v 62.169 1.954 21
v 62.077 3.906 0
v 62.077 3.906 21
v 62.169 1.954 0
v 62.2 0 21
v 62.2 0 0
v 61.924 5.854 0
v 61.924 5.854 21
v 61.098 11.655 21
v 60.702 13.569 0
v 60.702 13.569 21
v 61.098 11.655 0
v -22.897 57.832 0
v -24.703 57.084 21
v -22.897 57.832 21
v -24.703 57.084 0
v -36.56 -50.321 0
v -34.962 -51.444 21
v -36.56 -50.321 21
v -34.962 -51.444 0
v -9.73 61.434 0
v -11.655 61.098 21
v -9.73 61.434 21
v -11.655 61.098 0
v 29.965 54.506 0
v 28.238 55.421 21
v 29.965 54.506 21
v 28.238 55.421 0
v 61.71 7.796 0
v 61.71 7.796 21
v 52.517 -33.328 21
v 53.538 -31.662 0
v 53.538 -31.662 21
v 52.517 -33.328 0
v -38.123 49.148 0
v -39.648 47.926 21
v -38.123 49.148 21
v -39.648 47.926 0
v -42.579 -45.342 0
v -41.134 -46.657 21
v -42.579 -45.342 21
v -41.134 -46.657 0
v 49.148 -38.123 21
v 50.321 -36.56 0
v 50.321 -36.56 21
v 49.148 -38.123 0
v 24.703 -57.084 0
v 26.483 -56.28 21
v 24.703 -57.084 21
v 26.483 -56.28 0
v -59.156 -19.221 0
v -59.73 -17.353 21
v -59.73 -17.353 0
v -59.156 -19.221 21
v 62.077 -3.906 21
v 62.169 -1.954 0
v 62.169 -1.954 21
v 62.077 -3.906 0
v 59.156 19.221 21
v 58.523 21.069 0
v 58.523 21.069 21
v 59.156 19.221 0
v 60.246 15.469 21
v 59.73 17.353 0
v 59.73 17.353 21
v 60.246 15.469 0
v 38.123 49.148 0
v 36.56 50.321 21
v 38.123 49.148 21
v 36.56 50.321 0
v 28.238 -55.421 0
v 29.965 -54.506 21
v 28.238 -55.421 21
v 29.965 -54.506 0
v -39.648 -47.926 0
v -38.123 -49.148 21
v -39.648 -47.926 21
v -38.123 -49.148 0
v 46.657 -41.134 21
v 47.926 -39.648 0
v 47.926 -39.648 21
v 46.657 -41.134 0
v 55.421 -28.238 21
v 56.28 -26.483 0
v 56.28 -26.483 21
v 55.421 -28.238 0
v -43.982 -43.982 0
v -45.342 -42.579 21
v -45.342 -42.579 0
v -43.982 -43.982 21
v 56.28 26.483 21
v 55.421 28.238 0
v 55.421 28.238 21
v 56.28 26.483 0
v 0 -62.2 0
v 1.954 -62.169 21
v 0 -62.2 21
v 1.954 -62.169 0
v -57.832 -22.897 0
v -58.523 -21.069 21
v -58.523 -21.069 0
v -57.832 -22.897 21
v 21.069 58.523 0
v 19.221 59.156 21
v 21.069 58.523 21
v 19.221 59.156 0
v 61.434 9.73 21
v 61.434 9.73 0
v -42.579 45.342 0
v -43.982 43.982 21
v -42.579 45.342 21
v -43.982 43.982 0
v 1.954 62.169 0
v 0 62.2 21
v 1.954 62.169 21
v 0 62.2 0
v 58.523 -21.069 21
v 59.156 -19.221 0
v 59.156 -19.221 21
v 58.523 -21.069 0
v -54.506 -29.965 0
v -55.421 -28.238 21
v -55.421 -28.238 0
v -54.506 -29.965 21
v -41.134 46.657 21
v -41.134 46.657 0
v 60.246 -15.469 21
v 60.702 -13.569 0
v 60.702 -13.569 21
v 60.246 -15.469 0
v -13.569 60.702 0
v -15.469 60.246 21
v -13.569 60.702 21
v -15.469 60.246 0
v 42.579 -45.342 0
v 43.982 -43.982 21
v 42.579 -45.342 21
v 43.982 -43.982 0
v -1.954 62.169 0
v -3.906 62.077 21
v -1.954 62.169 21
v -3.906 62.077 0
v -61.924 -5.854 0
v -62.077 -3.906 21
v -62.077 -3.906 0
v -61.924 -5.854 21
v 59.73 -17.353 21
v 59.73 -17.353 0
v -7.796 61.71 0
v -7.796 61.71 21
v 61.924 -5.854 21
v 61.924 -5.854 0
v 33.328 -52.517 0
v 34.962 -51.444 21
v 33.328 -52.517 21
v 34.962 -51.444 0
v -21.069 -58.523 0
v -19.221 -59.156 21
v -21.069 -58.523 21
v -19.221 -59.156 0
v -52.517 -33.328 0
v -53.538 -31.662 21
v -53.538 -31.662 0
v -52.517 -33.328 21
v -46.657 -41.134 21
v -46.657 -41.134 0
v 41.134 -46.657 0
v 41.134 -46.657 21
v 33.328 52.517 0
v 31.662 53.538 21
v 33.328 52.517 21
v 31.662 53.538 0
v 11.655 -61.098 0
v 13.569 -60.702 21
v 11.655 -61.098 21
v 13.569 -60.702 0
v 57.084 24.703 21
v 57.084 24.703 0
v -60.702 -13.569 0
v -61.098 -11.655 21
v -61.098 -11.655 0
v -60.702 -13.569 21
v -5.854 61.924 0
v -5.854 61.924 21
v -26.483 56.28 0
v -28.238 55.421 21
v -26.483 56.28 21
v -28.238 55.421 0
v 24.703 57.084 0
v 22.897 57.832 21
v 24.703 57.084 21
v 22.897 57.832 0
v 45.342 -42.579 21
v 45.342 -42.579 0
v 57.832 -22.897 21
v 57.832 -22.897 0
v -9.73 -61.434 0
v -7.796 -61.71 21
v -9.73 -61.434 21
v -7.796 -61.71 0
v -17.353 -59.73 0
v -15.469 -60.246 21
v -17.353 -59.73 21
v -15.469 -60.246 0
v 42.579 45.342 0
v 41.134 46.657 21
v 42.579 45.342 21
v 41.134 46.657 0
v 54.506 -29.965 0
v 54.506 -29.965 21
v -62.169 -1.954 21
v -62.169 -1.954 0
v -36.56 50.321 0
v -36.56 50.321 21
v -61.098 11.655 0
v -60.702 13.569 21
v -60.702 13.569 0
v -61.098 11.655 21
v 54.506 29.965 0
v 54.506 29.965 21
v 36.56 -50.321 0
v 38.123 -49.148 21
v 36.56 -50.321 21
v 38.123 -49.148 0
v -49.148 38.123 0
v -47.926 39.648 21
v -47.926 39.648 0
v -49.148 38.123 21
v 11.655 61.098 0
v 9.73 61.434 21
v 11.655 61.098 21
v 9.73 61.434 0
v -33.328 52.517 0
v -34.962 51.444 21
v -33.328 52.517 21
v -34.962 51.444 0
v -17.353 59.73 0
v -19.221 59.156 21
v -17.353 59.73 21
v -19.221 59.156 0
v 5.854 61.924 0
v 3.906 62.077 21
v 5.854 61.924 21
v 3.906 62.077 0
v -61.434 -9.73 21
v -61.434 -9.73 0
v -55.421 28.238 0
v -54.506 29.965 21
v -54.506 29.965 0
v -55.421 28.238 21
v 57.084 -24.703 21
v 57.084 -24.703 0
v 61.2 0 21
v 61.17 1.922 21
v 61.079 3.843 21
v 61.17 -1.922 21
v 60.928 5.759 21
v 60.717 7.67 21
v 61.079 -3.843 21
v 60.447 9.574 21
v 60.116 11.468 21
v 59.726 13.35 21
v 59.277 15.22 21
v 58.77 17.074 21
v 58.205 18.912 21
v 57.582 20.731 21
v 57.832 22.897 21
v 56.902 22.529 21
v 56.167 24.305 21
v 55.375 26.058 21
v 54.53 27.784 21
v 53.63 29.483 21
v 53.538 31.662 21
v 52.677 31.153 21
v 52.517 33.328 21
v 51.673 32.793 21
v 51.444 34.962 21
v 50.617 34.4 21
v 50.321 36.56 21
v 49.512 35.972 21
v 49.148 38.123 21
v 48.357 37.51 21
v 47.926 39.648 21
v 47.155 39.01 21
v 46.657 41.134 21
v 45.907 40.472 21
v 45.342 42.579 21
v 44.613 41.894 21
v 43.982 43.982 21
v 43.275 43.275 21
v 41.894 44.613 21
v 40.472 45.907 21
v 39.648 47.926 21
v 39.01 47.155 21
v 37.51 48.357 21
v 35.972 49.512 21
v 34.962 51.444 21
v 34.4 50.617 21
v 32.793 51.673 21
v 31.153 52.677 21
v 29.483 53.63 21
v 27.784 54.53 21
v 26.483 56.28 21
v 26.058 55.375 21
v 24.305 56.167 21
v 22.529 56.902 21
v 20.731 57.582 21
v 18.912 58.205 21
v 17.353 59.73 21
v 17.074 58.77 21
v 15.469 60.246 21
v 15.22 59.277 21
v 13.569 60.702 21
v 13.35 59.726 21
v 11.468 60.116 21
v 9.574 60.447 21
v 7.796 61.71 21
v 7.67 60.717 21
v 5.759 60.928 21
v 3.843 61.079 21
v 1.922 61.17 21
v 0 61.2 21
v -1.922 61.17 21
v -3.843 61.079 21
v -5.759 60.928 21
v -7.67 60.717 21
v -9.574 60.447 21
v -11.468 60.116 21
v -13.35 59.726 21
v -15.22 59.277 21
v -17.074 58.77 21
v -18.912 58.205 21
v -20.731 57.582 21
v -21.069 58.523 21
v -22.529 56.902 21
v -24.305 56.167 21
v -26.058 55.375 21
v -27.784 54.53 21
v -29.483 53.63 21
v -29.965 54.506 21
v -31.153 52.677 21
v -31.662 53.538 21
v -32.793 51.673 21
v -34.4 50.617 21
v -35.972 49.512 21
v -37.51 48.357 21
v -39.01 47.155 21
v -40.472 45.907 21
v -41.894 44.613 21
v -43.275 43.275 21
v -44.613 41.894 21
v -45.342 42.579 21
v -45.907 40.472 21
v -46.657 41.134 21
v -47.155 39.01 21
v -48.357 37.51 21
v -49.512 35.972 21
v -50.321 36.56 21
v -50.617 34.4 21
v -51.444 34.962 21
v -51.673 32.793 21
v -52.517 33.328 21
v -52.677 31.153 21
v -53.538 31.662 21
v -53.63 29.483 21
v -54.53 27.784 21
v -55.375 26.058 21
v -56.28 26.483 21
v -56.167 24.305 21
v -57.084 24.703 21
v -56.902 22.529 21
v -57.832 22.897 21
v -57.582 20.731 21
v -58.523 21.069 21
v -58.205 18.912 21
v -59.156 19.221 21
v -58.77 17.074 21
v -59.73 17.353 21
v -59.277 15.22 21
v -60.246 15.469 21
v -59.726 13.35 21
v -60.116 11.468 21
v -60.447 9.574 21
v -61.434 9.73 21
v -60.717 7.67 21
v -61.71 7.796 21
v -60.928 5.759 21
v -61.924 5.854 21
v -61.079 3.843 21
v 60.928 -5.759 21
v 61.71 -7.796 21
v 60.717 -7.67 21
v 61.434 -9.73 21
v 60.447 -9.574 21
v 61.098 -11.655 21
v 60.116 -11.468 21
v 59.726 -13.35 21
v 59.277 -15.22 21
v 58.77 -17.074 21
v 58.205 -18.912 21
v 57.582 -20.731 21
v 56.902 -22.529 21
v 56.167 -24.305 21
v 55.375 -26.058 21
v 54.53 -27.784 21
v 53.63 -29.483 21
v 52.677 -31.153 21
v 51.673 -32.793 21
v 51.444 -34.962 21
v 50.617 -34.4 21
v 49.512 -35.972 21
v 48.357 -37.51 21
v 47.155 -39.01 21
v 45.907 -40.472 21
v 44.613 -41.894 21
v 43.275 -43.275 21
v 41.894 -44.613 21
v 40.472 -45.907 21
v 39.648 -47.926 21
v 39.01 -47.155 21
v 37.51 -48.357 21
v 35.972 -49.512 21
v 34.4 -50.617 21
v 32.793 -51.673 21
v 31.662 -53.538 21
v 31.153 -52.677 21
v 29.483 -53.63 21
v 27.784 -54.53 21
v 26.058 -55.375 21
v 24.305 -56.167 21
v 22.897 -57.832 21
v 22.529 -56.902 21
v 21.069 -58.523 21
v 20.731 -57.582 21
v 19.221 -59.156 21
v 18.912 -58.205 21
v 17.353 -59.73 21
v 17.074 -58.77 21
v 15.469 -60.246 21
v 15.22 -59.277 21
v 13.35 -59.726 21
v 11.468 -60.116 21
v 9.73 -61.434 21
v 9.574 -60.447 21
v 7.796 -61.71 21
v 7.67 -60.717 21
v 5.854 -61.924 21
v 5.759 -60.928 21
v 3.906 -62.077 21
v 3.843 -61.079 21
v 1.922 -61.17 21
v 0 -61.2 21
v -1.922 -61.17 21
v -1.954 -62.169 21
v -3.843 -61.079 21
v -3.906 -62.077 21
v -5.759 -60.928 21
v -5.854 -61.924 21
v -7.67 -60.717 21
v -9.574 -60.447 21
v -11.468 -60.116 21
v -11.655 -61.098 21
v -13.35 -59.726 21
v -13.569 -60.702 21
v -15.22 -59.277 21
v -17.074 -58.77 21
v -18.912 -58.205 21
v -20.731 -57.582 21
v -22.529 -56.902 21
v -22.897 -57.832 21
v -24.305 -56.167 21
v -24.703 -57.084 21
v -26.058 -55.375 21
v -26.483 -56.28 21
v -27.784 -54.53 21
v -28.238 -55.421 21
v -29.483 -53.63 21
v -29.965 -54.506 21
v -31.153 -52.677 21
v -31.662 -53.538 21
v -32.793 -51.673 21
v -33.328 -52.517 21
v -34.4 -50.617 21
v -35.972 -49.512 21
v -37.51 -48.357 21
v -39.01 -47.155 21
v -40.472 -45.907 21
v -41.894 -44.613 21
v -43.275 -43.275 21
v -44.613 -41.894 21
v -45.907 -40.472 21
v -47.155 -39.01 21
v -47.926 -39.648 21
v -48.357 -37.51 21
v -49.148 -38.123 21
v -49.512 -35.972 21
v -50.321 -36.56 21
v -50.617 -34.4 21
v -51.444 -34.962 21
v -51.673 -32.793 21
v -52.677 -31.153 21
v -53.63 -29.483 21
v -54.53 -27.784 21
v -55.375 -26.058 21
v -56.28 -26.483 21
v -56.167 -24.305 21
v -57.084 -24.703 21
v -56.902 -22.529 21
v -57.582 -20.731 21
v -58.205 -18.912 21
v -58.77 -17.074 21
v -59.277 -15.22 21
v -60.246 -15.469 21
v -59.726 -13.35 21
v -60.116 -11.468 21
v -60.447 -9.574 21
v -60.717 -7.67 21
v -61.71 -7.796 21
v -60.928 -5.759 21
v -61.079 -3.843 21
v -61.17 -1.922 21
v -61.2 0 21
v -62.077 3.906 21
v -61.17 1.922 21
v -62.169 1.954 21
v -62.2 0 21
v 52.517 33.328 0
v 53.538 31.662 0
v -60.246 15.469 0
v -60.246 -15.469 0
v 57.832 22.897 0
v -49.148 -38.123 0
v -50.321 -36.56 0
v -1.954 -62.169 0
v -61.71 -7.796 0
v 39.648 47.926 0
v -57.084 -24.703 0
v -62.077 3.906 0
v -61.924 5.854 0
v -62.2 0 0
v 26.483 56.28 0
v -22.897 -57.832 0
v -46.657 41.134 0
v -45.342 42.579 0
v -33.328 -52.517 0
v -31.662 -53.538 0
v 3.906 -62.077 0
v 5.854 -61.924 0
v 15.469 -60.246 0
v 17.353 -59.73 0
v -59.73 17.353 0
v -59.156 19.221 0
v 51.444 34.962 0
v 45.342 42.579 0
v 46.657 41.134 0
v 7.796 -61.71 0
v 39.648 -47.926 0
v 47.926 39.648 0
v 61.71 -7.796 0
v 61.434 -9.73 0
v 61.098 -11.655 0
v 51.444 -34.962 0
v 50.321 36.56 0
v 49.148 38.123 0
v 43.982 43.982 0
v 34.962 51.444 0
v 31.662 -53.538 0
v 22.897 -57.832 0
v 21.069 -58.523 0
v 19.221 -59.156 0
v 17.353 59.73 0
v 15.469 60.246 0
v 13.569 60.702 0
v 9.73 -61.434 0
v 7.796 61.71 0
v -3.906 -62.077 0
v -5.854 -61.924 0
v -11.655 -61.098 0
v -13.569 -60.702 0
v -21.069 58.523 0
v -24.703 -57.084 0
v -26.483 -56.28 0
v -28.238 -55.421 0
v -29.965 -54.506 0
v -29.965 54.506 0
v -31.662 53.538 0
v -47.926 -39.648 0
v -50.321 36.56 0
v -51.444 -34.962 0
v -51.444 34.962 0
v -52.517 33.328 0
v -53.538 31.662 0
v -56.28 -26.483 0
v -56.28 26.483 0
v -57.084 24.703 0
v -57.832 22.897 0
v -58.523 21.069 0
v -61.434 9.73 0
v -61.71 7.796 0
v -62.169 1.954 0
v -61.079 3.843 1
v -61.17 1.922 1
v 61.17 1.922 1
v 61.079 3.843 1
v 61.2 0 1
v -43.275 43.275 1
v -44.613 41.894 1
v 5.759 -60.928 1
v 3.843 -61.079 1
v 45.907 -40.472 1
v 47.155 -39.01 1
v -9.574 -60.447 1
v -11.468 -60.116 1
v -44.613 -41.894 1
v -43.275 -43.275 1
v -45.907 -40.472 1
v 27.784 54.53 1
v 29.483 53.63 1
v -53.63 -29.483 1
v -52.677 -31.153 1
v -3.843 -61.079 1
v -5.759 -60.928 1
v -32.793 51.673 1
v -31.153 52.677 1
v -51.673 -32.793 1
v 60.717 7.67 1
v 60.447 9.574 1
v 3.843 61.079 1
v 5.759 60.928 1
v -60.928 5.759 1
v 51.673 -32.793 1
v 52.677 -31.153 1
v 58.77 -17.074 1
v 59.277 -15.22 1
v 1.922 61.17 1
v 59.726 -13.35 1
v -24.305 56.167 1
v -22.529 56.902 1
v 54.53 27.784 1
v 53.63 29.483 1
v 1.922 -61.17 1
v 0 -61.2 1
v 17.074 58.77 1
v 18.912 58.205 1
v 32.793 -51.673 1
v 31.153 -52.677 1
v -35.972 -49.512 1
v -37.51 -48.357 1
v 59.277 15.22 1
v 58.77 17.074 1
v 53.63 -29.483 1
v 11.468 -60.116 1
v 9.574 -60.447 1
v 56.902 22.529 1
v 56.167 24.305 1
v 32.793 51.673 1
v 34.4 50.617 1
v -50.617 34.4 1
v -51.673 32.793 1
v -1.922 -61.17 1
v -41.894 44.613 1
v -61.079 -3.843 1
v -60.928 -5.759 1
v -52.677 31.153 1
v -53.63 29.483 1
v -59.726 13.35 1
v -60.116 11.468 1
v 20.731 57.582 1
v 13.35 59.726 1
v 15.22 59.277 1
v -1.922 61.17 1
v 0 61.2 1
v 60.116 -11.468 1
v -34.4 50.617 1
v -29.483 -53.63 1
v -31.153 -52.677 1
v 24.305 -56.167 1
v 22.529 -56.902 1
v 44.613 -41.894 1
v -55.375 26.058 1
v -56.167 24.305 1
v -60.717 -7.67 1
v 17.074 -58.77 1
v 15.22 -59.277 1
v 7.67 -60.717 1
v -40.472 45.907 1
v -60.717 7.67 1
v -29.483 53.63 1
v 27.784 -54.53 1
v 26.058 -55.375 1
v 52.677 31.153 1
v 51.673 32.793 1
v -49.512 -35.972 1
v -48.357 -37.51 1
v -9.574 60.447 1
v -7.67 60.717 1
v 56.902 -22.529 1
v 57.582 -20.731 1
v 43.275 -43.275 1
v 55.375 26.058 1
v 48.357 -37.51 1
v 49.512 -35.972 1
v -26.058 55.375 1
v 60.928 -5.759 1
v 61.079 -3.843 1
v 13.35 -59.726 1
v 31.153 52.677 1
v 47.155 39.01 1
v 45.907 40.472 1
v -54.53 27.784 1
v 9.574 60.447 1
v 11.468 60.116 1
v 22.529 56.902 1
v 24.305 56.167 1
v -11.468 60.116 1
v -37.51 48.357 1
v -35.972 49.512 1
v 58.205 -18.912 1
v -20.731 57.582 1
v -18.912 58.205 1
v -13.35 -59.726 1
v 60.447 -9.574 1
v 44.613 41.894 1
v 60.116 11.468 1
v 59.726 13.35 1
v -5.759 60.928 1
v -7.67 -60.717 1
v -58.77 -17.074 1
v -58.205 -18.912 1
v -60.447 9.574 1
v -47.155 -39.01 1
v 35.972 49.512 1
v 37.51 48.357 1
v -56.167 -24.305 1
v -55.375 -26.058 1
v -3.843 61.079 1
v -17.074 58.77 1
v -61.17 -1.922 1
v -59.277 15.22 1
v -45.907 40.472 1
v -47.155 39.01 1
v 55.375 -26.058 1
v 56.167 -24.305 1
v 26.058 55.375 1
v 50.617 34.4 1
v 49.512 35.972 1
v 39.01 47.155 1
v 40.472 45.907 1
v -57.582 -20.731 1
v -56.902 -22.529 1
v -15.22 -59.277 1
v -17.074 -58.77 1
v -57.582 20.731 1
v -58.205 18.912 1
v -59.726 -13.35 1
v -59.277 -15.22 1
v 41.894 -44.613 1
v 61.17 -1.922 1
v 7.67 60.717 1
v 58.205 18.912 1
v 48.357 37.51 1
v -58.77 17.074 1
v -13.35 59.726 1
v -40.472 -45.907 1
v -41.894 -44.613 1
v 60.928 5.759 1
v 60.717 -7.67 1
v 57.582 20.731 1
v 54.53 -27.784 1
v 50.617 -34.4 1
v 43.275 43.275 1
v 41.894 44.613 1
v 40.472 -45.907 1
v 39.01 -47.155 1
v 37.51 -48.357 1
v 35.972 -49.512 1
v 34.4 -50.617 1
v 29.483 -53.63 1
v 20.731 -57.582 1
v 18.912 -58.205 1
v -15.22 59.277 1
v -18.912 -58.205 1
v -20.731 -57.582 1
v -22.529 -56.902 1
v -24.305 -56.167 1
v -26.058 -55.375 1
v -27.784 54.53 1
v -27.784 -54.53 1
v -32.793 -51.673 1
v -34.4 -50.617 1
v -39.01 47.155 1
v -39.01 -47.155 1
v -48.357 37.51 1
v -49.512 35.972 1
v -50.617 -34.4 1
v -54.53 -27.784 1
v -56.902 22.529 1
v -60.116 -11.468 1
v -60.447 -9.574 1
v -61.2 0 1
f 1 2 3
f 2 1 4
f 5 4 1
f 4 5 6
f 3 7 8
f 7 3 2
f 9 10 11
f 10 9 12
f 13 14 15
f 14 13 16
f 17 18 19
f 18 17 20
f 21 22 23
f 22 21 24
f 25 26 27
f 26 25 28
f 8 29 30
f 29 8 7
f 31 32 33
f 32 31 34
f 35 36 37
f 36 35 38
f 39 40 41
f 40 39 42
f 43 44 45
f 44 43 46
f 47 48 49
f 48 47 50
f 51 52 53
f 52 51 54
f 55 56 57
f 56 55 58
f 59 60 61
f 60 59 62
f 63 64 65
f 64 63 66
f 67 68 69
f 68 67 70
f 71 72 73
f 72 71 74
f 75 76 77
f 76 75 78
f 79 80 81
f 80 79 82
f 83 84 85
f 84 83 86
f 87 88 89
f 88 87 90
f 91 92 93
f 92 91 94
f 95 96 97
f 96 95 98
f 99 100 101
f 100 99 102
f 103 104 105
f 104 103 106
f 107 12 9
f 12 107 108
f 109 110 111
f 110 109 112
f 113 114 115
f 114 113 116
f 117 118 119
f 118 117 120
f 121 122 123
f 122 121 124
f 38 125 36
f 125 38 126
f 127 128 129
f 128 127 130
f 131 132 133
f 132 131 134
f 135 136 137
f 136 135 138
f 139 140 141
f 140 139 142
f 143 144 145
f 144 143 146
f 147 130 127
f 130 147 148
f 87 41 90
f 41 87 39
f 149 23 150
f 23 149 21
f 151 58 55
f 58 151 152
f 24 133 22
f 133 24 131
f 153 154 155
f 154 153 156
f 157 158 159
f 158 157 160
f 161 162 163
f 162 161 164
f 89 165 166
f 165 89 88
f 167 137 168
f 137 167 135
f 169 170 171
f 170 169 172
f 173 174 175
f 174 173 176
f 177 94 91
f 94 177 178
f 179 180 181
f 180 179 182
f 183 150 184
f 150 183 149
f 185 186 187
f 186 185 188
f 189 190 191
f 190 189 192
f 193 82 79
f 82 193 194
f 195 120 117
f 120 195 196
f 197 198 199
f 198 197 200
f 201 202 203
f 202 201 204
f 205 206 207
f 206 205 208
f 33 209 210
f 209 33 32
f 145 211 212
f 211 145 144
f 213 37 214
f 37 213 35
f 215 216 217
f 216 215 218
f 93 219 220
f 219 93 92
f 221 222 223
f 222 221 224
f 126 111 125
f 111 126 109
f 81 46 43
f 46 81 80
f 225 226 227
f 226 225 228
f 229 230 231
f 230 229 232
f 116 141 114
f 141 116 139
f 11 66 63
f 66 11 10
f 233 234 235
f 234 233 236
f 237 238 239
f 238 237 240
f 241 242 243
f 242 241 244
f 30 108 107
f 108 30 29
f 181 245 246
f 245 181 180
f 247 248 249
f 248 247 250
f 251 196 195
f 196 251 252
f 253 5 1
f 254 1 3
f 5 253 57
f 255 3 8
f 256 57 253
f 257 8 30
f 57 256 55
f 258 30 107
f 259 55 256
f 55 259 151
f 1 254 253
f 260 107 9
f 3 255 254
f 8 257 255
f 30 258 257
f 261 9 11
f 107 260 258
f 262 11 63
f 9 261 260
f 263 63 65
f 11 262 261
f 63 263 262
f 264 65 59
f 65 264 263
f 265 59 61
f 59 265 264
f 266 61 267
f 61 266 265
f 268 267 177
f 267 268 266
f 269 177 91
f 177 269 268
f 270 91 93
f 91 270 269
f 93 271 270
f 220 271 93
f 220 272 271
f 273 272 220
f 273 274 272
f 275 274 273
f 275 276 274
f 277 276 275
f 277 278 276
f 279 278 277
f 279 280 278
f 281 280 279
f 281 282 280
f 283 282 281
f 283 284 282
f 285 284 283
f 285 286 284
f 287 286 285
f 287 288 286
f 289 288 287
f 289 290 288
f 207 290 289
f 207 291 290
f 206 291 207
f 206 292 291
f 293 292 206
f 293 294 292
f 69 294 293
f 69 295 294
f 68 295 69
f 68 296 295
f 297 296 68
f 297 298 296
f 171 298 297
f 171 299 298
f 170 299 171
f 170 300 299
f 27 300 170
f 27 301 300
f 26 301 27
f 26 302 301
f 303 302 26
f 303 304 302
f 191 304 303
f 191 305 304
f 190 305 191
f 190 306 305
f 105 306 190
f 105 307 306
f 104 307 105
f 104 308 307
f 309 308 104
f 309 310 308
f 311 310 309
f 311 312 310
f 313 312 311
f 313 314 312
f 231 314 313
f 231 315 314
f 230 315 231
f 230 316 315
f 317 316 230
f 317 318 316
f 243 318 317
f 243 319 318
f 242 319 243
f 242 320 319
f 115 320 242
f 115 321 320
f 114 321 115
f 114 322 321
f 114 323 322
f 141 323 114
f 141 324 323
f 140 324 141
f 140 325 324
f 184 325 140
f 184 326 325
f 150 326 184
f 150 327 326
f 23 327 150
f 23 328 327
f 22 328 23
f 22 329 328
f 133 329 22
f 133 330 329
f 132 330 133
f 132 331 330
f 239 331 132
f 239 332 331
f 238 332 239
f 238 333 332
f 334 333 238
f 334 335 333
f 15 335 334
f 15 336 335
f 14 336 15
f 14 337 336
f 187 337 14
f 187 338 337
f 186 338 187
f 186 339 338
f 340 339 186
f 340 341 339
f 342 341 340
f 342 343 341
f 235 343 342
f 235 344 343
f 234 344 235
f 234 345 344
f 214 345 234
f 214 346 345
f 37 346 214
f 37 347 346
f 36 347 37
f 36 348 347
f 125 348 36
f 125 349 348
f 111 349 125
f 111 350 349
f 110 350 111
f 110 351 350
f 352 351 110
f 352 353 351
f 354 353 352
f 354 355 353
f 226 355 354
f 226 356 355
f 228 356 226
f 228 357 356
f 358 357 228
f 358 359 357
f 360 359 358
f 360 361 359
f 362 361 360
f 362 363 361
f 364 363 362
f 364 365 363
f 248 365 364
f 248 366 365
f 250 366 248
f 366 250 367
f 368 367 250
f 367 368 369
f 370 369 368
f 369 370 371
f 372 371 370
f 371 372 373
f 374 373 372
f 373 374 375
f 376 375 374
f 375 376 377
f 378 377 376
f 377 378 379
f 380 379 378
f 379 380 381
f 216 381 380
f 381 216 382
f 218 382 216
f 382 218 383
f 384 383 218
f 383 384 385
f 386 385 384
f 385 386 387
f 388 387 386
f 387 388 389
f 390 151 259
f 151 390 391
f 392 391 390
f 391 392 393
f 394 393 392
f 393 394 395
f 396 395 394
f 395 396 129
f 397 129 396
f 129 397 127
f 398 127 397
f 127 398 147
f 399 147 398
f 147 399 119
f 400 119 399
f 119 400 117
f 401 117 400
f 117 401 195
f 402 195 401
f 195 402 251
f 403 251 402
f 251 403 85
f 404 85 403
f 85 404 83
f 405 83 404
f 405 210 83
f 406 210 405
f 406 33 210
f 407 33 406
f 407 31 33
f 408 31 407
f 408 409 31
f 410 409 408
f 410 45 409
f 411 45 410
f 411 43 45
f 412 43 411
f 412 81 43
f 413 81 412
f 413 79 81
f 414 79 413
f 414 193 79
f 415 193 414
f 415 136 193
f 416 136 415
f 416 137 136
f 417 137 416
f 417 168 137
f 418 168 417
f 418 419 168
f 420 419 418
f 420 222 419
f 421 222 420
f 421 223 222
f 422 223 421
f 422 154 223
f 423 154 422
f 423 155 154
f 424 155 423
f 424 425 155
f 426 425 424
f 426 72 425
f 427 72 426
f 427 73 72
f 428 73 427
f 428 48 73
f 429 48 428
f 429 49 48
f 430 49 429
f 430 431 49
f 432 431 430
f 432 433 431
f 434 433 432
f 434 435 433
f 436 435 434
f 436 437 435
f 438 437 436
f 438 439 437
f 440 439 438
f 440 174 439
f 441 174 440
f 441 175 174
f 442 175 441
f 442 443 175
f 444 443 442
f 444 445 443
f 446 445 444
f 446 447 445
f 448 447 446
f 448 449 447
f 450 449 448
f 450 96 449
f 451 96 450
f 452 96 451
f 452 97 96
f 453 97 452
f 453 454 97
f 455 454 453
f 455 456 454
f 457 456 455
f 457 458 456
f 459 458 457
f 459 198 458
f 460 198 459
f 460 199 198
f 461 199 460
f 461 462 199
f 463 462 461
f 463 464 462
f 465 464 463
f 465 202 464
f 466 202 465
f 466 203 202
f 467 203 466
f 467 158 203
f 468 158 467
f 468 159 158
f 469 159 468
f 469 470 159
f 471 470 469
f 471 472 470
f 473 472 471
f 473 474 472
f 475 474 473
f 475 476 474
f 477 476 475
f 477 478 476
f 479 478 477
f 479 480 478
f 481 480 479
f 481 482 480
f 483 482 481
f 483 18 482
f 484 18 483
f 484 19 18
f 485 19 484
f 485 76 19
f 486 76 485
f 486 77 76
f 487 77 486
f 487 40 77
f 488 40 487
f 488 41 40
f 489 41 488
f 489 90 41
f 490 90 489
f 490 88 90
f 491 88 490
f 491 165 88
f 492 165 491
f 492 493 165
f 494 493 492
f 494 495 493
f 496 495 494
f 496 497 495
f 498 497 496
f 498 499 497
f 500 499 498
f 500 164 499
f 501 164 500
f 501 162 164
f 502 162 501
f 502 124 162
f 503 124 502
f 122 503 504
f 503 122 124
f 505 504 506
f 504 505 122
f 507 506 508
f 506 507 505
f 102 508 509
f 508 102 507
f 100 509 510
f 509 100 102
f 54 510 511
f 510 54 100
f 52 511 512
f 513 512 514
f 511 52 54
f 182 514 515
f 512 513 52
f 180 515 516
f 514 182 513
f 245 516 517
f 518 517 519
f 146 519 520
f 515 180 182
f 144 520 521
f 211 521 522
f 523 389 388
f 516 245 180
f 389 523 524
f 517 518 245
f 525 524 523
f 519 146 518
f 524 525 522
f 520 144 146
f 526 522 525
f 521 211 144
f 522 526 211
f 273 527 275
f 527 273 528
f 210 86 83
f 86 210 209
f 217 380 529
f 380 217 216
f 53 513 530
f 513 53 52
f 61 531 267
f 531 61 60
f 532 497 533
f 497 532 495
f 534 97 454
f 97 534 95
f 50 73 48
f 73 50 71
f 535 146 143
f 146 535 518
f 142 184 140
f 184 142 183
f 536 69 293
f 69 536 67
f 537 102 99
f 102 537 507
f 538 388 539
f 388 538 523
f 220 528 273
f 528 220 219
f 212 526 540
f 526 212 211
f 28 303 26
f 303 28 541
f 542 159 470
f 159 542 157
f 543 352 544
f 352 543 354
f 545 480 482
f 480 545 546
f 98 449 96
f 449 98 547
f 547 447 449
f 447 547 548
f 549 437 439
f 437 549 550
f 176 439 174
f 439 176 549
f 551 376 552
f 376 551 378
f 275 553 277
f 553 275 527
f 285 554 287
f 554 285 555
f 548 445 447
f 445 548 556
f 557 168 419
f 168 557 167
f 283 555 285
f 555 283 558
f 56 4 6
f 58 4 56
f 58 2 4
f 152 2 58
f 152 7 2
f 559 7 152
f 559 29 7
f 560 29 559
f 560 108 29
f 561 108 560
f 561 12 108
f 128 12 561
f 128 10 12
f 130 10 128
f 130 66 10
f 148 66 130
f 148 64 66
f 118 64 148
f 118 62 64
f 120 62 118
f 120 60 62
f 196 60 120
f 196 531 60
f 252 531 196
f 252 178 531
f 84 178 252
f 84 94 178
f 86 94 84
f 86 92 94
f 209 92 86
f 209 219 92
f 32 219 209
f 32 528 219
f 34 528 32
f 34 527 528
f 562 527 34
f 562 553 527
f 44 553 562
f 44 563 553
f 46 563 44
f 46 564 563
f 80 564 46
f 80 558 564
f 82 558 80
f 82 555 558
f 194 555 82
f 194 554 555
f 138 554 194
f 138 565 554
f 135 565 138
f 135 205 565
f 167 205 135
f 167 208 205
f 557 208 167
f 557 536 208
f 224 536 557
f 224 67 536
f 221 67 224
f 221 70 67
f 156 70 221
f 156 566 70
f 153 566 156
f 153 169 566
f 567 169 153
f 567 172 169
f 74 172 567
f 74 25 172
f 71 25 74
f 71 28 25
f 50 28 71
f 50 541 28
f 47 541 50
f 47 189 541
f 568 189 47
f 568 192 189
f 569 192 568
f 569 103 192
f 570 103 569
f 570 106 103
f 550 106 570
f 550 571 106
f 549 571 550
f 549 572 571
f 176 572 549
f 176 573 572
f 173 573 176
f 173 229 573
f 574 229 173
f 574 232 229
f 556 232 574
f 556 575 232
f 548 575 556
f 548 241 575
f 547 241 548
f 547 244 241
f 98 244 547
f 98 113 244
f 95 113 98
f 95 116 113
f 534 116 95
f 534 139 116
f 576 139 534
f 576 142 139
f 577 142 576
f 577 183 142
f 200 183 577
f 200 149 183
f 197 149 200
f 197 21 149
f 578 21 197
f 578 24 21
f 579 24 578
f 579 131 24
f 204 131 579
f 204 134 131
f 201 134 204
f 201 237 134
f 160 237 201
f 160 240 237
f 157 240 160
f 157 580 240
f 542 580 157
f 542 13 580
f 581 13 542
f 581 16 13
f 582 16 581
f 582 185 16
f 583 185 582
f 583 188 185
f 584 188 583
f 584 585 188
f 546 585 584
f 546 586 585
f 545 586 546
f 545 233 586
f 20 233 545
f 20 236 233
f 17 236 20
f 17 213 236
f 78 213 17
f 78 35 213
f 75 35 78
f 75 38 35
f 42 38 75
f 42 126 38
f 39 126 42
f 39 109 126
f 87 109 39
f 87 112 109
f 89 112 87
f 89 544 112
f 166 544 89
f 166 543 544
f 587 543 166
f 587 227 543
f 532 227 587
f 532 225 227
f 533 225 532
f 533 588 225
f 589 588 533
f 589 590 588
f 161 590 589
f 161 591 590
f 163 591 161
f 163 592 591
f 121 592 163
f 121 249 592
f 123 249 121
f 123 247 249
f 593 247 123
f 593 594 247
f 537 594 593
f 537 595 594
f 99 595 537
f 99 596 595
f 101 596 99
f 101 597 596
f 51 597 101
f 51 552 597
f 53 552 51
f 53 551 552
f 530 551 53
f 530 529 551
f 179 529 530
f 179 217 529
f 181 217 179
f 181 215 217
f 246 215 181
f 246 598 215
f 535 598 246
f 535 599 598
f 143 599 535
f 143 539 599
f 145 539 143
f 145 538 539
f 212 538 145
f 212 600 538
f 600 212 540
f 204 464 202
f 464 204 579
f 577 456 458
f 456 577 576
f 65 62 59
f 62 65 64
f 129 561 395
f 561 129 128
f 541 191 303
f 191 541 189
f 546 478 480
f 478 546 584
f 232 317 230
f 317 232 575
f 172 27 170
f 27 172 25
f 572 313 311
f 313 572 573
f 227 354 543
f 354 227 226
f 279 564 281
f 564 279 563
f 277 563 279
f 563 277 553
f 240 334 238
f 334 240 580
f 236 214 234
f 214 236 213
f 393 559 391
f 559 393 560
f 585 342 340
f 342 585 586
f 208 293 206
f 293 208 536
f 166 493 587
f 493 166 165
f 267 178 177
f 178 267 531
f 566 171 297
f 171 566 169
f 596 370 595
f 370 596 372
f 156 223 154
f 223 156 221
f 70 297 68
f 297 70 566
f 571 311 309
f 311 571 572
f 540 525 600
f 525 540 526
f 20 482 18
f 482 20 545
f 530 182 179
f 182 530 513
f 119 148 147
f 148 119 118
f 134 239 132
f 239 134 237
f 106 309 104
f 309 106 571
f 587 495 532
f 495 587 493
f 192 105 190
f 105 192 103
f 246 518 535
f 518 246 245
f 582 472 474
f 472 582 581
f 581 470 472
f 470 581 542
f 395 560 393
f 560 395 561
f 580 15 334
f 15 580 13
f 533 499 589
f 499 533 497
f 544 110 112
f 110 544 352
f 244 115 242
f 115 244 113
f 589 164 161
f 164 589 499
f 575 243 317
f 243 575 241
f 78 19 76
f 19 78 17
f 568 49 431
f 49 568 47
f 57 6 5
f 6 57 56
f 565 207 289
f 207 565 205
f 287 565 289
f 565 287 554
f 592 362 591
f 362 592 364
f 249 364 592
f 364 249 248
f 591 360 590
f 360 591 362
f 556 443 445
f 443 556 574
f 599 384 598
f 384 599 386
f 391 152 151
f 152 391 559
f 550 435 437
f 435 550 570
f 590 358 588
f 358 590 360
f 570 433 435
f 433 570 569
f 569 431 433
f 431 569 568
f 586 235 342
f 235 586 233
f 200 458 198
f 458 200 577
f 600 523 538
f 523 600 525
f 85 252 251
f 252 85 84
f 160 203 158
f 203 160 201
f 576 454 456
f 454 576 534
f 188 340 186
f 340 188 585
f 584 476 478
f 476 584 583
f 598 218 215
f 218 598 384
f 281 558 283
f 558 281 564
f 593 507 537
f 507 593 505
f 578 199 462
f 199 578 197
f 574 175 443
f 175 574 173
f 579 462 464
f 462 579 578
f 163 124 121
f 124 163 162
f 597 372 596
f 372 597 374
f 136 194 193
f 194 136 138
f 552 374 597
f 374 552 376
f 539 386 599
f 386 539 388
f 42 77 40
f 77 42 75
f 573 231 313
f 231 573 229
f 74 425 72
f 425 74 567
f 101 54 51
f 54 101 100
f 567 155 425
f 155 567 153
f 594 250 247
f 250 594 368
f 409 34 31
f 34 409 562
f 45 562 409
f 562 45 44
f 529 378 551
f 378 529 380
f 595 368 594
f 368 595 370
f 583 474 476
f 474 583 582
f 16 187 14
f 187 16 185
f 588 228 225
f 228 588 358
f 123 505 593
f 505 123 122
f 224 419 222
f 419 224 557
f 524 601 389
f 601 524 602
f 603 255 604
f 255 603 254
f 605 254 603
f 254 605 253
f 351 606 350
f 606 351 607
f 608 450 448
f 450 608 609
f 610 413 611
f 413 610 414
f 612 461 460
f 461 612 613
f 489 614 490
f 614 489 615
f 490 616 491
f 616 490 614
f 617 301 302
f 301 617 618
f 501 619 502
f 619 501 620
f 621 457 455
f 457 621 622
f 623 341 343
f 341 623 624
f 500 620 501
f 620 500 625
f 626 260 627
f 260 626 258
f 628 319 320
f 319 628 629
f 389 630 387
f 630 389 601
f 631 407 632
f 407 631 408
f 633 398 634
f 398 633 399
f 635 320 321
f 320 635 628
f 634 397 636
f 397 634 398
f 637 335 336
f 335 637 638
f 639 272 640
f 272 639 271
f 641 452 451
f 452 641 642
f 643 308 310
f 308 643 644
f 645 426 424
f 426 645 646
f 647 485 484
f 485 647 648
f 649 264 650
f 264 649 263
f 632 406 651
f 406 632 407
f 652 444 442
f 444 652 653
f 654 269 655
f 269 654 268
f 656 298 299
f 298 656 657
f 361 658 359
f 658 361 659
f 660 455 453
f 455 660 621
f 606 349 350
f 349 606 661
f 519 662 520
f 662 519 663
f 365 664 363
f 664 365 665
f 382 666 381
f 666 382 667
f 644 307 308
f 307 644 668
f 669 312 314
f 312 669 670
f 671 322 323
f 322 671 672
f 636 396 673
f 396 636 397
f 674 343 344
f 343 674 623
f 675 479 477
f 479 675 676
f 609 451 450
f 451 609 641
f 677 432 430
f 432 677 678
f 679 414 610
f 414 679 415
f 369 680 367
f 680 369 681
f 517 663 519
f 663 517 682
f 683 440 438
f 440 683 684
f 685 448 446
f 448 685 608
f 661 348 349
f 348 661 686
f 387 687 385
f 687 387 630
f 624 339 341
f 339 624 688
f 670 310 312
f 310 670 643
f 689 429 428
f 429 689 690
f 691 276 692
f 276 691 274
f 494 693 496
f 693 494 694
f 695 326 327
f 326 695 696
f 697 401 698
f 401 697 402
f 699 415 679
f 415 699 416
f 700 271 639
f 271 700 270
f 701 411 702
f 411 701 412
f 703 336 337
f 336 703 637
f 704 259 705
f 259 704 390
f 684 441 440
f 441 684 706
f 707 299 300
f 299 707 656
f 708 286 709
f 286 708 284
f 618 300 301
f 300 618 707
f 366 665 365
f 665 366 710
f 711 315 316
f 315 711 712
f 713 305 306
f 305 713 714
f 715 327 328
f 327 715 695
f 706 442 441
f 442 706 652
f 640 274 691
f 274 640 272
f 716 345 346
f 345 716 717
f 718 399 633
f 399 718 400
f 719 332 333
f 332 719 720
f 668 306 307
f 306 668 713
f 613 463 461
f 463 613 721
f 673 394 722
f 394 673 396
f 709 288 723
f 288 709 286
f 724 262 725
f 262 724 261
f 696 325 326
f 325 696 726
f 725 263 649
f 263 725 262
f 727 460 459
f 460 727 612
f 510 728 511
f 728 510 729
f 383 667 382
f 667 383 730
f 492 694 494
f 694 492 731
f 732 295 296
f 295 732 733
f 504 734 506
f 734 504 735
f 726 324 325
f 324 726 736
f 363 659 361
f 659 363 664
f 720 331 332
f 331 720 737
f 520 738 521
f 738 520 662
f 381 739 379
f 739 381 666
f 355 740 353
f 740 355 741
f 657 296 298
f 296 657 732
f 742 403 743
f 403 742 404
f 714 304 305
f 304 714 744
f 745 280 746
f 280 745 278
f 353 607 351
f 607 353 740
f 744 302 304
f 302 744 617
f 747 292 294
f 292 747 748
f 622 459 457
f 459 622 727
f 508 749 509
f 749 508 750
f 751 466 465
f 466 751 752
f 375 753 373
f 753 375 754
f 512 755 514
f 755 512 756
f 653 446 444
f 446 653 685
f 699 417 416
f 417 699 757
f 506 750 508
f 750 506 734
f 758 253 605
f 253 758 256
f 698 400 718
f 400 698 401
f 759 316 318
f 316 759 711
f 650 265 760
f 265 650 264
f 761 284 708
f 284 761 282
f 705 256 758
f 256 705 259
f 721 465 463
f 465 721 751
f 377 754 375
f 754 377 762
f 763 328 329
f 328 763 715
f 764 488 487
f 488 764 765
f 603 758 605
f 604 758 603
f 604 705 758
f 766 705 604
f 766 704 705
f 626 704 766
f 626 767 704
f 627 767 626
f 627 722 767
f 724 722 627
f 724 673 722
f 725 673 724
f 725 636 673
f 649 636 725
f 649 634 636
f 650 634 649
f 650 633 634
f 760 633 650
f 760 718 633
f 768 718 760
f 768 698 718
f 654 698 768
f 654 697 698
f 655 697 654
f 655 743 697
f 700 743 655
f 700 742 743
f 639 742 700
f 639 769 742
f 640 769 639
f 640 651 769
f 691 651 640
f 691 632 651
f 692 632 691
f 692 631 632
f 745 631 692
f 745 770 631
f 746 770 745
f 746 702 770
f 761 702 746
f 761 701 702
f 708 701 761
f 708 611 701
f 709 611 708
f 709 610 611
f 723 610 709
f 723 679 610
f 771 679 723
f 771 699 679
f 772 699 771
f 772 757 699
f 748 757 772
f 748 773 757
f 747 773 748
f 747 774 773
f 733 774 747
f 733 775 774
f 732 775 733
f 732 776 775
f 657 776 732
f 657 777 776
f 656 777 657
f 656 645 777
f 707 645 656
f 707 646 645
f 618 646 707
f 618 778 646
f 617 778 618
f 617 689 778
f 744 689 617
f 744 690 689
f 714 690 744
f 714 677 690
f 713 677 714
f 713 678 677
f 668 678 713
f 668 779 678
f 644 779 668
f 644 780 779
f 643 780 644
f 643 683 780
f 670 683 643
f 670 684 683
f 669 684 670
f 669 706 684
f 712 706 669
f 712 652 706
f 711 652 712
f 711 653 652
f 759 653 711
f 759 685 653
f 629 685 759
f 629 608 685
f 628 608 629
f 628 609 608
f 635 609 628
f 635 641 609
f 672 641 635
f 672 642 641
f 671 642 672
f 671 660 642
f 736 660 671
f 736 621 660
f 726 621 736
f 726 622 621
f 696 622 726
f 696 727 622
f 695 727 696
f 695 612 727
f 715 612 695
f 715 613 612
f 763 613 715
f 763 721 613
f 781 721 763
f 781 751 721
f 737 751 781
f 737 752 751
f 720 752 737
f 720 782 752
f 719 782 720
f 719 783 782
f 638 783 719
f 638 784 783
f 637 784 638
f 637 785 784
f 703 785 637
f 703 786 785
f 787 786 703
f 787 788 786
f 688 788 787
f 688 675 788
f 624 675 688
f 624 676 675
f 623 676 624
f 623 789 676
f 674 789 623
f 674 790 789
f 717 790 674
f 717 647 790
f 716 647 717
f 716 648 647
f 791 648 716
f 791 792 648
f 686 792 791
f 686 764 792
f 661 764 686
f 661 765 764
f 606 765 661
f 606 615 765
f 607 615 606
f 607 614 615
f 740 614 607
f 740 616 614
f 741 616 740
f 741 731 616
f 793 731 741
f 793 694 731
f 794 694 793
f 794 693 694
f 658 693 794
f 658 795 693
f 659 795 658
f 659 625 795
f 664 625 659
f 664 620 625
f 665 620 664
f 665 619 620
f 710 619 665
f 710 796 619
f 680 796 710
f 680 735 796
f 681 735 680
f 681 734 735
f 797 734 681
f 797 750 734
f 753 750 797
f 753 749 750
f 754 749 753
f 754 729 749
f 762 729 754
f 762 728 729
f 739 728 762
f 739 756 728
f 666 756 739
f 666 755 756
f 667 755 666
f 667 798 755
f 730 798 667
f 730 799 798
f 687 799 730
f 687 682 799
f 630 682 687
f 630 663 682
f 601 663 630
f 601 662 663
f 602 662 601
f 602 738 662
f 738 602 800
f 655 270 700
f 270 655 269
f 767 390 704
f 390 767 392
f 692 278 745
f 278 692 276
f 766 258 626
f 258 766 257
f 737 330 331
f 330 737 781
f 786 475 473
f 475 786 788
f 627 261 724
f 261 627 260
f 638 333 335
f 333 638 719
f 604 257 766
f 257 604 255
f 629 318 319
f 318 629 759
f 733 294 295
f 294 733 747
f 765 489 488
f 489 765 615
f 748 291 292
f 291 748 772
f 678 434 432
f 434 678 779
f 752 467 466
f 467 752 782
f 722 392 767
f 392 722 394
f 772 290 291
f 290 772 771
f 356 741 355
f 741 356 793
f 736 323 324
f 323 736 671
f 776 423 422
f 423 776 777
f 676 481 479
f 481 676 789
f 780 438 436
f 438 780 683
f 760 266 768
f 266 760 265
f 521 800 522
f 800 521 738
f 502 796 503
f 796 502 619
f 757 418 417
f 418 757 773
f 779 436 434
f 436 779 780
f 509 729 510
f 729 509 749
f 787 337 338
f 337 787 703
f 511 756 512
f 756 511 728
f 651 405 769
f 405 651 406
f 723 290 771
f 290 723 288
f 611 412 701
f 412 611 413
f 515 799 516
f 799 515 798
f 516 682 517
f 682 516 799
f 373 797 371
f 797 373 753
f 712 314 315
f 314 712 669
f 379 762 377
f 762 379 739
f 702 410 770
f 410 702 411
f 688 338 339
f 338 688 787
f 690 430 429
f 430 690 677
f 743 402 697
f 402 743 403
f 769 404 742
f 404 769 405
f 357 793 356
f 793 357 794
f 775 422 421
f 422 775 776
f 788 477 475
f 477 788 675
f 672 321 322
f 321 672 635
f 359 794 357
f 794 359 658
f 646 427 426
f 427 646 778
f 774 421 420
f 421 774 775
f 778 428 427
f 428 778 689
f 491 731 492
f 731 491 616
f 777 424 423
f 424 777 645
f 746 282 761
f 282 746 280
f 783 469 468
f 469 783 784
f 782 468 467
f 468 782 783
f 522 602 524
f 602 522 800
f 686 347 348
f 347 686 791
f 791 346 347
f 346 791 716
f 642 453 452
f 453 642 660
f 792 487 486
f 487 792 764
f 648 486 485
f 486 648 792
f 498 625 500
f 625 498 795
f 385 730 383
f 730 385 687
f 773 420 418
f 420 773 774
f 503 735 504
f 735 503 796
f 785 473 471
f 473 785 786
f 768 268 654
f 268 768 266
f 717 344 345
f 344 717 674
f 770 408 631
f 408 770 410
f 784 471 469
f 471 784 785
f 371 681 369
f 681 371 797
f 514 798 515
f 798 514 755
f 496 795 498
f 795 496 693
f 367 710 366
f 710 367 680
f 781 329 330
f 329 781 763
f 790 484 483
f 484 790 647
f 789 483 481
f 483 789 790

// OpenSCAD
module giftbox(diameter, height){
    difference() {
        cylinder(d=diameter + 2, h=height + 1, $fn=200);
        translate([0,0,1]) cylinder(d=diameter, h=height + 1, $fn=200);
    }
}

// Ejemplo de uso
// giftbox(120, 130);
giftbox(120 + 2 + 0.4, 20);
